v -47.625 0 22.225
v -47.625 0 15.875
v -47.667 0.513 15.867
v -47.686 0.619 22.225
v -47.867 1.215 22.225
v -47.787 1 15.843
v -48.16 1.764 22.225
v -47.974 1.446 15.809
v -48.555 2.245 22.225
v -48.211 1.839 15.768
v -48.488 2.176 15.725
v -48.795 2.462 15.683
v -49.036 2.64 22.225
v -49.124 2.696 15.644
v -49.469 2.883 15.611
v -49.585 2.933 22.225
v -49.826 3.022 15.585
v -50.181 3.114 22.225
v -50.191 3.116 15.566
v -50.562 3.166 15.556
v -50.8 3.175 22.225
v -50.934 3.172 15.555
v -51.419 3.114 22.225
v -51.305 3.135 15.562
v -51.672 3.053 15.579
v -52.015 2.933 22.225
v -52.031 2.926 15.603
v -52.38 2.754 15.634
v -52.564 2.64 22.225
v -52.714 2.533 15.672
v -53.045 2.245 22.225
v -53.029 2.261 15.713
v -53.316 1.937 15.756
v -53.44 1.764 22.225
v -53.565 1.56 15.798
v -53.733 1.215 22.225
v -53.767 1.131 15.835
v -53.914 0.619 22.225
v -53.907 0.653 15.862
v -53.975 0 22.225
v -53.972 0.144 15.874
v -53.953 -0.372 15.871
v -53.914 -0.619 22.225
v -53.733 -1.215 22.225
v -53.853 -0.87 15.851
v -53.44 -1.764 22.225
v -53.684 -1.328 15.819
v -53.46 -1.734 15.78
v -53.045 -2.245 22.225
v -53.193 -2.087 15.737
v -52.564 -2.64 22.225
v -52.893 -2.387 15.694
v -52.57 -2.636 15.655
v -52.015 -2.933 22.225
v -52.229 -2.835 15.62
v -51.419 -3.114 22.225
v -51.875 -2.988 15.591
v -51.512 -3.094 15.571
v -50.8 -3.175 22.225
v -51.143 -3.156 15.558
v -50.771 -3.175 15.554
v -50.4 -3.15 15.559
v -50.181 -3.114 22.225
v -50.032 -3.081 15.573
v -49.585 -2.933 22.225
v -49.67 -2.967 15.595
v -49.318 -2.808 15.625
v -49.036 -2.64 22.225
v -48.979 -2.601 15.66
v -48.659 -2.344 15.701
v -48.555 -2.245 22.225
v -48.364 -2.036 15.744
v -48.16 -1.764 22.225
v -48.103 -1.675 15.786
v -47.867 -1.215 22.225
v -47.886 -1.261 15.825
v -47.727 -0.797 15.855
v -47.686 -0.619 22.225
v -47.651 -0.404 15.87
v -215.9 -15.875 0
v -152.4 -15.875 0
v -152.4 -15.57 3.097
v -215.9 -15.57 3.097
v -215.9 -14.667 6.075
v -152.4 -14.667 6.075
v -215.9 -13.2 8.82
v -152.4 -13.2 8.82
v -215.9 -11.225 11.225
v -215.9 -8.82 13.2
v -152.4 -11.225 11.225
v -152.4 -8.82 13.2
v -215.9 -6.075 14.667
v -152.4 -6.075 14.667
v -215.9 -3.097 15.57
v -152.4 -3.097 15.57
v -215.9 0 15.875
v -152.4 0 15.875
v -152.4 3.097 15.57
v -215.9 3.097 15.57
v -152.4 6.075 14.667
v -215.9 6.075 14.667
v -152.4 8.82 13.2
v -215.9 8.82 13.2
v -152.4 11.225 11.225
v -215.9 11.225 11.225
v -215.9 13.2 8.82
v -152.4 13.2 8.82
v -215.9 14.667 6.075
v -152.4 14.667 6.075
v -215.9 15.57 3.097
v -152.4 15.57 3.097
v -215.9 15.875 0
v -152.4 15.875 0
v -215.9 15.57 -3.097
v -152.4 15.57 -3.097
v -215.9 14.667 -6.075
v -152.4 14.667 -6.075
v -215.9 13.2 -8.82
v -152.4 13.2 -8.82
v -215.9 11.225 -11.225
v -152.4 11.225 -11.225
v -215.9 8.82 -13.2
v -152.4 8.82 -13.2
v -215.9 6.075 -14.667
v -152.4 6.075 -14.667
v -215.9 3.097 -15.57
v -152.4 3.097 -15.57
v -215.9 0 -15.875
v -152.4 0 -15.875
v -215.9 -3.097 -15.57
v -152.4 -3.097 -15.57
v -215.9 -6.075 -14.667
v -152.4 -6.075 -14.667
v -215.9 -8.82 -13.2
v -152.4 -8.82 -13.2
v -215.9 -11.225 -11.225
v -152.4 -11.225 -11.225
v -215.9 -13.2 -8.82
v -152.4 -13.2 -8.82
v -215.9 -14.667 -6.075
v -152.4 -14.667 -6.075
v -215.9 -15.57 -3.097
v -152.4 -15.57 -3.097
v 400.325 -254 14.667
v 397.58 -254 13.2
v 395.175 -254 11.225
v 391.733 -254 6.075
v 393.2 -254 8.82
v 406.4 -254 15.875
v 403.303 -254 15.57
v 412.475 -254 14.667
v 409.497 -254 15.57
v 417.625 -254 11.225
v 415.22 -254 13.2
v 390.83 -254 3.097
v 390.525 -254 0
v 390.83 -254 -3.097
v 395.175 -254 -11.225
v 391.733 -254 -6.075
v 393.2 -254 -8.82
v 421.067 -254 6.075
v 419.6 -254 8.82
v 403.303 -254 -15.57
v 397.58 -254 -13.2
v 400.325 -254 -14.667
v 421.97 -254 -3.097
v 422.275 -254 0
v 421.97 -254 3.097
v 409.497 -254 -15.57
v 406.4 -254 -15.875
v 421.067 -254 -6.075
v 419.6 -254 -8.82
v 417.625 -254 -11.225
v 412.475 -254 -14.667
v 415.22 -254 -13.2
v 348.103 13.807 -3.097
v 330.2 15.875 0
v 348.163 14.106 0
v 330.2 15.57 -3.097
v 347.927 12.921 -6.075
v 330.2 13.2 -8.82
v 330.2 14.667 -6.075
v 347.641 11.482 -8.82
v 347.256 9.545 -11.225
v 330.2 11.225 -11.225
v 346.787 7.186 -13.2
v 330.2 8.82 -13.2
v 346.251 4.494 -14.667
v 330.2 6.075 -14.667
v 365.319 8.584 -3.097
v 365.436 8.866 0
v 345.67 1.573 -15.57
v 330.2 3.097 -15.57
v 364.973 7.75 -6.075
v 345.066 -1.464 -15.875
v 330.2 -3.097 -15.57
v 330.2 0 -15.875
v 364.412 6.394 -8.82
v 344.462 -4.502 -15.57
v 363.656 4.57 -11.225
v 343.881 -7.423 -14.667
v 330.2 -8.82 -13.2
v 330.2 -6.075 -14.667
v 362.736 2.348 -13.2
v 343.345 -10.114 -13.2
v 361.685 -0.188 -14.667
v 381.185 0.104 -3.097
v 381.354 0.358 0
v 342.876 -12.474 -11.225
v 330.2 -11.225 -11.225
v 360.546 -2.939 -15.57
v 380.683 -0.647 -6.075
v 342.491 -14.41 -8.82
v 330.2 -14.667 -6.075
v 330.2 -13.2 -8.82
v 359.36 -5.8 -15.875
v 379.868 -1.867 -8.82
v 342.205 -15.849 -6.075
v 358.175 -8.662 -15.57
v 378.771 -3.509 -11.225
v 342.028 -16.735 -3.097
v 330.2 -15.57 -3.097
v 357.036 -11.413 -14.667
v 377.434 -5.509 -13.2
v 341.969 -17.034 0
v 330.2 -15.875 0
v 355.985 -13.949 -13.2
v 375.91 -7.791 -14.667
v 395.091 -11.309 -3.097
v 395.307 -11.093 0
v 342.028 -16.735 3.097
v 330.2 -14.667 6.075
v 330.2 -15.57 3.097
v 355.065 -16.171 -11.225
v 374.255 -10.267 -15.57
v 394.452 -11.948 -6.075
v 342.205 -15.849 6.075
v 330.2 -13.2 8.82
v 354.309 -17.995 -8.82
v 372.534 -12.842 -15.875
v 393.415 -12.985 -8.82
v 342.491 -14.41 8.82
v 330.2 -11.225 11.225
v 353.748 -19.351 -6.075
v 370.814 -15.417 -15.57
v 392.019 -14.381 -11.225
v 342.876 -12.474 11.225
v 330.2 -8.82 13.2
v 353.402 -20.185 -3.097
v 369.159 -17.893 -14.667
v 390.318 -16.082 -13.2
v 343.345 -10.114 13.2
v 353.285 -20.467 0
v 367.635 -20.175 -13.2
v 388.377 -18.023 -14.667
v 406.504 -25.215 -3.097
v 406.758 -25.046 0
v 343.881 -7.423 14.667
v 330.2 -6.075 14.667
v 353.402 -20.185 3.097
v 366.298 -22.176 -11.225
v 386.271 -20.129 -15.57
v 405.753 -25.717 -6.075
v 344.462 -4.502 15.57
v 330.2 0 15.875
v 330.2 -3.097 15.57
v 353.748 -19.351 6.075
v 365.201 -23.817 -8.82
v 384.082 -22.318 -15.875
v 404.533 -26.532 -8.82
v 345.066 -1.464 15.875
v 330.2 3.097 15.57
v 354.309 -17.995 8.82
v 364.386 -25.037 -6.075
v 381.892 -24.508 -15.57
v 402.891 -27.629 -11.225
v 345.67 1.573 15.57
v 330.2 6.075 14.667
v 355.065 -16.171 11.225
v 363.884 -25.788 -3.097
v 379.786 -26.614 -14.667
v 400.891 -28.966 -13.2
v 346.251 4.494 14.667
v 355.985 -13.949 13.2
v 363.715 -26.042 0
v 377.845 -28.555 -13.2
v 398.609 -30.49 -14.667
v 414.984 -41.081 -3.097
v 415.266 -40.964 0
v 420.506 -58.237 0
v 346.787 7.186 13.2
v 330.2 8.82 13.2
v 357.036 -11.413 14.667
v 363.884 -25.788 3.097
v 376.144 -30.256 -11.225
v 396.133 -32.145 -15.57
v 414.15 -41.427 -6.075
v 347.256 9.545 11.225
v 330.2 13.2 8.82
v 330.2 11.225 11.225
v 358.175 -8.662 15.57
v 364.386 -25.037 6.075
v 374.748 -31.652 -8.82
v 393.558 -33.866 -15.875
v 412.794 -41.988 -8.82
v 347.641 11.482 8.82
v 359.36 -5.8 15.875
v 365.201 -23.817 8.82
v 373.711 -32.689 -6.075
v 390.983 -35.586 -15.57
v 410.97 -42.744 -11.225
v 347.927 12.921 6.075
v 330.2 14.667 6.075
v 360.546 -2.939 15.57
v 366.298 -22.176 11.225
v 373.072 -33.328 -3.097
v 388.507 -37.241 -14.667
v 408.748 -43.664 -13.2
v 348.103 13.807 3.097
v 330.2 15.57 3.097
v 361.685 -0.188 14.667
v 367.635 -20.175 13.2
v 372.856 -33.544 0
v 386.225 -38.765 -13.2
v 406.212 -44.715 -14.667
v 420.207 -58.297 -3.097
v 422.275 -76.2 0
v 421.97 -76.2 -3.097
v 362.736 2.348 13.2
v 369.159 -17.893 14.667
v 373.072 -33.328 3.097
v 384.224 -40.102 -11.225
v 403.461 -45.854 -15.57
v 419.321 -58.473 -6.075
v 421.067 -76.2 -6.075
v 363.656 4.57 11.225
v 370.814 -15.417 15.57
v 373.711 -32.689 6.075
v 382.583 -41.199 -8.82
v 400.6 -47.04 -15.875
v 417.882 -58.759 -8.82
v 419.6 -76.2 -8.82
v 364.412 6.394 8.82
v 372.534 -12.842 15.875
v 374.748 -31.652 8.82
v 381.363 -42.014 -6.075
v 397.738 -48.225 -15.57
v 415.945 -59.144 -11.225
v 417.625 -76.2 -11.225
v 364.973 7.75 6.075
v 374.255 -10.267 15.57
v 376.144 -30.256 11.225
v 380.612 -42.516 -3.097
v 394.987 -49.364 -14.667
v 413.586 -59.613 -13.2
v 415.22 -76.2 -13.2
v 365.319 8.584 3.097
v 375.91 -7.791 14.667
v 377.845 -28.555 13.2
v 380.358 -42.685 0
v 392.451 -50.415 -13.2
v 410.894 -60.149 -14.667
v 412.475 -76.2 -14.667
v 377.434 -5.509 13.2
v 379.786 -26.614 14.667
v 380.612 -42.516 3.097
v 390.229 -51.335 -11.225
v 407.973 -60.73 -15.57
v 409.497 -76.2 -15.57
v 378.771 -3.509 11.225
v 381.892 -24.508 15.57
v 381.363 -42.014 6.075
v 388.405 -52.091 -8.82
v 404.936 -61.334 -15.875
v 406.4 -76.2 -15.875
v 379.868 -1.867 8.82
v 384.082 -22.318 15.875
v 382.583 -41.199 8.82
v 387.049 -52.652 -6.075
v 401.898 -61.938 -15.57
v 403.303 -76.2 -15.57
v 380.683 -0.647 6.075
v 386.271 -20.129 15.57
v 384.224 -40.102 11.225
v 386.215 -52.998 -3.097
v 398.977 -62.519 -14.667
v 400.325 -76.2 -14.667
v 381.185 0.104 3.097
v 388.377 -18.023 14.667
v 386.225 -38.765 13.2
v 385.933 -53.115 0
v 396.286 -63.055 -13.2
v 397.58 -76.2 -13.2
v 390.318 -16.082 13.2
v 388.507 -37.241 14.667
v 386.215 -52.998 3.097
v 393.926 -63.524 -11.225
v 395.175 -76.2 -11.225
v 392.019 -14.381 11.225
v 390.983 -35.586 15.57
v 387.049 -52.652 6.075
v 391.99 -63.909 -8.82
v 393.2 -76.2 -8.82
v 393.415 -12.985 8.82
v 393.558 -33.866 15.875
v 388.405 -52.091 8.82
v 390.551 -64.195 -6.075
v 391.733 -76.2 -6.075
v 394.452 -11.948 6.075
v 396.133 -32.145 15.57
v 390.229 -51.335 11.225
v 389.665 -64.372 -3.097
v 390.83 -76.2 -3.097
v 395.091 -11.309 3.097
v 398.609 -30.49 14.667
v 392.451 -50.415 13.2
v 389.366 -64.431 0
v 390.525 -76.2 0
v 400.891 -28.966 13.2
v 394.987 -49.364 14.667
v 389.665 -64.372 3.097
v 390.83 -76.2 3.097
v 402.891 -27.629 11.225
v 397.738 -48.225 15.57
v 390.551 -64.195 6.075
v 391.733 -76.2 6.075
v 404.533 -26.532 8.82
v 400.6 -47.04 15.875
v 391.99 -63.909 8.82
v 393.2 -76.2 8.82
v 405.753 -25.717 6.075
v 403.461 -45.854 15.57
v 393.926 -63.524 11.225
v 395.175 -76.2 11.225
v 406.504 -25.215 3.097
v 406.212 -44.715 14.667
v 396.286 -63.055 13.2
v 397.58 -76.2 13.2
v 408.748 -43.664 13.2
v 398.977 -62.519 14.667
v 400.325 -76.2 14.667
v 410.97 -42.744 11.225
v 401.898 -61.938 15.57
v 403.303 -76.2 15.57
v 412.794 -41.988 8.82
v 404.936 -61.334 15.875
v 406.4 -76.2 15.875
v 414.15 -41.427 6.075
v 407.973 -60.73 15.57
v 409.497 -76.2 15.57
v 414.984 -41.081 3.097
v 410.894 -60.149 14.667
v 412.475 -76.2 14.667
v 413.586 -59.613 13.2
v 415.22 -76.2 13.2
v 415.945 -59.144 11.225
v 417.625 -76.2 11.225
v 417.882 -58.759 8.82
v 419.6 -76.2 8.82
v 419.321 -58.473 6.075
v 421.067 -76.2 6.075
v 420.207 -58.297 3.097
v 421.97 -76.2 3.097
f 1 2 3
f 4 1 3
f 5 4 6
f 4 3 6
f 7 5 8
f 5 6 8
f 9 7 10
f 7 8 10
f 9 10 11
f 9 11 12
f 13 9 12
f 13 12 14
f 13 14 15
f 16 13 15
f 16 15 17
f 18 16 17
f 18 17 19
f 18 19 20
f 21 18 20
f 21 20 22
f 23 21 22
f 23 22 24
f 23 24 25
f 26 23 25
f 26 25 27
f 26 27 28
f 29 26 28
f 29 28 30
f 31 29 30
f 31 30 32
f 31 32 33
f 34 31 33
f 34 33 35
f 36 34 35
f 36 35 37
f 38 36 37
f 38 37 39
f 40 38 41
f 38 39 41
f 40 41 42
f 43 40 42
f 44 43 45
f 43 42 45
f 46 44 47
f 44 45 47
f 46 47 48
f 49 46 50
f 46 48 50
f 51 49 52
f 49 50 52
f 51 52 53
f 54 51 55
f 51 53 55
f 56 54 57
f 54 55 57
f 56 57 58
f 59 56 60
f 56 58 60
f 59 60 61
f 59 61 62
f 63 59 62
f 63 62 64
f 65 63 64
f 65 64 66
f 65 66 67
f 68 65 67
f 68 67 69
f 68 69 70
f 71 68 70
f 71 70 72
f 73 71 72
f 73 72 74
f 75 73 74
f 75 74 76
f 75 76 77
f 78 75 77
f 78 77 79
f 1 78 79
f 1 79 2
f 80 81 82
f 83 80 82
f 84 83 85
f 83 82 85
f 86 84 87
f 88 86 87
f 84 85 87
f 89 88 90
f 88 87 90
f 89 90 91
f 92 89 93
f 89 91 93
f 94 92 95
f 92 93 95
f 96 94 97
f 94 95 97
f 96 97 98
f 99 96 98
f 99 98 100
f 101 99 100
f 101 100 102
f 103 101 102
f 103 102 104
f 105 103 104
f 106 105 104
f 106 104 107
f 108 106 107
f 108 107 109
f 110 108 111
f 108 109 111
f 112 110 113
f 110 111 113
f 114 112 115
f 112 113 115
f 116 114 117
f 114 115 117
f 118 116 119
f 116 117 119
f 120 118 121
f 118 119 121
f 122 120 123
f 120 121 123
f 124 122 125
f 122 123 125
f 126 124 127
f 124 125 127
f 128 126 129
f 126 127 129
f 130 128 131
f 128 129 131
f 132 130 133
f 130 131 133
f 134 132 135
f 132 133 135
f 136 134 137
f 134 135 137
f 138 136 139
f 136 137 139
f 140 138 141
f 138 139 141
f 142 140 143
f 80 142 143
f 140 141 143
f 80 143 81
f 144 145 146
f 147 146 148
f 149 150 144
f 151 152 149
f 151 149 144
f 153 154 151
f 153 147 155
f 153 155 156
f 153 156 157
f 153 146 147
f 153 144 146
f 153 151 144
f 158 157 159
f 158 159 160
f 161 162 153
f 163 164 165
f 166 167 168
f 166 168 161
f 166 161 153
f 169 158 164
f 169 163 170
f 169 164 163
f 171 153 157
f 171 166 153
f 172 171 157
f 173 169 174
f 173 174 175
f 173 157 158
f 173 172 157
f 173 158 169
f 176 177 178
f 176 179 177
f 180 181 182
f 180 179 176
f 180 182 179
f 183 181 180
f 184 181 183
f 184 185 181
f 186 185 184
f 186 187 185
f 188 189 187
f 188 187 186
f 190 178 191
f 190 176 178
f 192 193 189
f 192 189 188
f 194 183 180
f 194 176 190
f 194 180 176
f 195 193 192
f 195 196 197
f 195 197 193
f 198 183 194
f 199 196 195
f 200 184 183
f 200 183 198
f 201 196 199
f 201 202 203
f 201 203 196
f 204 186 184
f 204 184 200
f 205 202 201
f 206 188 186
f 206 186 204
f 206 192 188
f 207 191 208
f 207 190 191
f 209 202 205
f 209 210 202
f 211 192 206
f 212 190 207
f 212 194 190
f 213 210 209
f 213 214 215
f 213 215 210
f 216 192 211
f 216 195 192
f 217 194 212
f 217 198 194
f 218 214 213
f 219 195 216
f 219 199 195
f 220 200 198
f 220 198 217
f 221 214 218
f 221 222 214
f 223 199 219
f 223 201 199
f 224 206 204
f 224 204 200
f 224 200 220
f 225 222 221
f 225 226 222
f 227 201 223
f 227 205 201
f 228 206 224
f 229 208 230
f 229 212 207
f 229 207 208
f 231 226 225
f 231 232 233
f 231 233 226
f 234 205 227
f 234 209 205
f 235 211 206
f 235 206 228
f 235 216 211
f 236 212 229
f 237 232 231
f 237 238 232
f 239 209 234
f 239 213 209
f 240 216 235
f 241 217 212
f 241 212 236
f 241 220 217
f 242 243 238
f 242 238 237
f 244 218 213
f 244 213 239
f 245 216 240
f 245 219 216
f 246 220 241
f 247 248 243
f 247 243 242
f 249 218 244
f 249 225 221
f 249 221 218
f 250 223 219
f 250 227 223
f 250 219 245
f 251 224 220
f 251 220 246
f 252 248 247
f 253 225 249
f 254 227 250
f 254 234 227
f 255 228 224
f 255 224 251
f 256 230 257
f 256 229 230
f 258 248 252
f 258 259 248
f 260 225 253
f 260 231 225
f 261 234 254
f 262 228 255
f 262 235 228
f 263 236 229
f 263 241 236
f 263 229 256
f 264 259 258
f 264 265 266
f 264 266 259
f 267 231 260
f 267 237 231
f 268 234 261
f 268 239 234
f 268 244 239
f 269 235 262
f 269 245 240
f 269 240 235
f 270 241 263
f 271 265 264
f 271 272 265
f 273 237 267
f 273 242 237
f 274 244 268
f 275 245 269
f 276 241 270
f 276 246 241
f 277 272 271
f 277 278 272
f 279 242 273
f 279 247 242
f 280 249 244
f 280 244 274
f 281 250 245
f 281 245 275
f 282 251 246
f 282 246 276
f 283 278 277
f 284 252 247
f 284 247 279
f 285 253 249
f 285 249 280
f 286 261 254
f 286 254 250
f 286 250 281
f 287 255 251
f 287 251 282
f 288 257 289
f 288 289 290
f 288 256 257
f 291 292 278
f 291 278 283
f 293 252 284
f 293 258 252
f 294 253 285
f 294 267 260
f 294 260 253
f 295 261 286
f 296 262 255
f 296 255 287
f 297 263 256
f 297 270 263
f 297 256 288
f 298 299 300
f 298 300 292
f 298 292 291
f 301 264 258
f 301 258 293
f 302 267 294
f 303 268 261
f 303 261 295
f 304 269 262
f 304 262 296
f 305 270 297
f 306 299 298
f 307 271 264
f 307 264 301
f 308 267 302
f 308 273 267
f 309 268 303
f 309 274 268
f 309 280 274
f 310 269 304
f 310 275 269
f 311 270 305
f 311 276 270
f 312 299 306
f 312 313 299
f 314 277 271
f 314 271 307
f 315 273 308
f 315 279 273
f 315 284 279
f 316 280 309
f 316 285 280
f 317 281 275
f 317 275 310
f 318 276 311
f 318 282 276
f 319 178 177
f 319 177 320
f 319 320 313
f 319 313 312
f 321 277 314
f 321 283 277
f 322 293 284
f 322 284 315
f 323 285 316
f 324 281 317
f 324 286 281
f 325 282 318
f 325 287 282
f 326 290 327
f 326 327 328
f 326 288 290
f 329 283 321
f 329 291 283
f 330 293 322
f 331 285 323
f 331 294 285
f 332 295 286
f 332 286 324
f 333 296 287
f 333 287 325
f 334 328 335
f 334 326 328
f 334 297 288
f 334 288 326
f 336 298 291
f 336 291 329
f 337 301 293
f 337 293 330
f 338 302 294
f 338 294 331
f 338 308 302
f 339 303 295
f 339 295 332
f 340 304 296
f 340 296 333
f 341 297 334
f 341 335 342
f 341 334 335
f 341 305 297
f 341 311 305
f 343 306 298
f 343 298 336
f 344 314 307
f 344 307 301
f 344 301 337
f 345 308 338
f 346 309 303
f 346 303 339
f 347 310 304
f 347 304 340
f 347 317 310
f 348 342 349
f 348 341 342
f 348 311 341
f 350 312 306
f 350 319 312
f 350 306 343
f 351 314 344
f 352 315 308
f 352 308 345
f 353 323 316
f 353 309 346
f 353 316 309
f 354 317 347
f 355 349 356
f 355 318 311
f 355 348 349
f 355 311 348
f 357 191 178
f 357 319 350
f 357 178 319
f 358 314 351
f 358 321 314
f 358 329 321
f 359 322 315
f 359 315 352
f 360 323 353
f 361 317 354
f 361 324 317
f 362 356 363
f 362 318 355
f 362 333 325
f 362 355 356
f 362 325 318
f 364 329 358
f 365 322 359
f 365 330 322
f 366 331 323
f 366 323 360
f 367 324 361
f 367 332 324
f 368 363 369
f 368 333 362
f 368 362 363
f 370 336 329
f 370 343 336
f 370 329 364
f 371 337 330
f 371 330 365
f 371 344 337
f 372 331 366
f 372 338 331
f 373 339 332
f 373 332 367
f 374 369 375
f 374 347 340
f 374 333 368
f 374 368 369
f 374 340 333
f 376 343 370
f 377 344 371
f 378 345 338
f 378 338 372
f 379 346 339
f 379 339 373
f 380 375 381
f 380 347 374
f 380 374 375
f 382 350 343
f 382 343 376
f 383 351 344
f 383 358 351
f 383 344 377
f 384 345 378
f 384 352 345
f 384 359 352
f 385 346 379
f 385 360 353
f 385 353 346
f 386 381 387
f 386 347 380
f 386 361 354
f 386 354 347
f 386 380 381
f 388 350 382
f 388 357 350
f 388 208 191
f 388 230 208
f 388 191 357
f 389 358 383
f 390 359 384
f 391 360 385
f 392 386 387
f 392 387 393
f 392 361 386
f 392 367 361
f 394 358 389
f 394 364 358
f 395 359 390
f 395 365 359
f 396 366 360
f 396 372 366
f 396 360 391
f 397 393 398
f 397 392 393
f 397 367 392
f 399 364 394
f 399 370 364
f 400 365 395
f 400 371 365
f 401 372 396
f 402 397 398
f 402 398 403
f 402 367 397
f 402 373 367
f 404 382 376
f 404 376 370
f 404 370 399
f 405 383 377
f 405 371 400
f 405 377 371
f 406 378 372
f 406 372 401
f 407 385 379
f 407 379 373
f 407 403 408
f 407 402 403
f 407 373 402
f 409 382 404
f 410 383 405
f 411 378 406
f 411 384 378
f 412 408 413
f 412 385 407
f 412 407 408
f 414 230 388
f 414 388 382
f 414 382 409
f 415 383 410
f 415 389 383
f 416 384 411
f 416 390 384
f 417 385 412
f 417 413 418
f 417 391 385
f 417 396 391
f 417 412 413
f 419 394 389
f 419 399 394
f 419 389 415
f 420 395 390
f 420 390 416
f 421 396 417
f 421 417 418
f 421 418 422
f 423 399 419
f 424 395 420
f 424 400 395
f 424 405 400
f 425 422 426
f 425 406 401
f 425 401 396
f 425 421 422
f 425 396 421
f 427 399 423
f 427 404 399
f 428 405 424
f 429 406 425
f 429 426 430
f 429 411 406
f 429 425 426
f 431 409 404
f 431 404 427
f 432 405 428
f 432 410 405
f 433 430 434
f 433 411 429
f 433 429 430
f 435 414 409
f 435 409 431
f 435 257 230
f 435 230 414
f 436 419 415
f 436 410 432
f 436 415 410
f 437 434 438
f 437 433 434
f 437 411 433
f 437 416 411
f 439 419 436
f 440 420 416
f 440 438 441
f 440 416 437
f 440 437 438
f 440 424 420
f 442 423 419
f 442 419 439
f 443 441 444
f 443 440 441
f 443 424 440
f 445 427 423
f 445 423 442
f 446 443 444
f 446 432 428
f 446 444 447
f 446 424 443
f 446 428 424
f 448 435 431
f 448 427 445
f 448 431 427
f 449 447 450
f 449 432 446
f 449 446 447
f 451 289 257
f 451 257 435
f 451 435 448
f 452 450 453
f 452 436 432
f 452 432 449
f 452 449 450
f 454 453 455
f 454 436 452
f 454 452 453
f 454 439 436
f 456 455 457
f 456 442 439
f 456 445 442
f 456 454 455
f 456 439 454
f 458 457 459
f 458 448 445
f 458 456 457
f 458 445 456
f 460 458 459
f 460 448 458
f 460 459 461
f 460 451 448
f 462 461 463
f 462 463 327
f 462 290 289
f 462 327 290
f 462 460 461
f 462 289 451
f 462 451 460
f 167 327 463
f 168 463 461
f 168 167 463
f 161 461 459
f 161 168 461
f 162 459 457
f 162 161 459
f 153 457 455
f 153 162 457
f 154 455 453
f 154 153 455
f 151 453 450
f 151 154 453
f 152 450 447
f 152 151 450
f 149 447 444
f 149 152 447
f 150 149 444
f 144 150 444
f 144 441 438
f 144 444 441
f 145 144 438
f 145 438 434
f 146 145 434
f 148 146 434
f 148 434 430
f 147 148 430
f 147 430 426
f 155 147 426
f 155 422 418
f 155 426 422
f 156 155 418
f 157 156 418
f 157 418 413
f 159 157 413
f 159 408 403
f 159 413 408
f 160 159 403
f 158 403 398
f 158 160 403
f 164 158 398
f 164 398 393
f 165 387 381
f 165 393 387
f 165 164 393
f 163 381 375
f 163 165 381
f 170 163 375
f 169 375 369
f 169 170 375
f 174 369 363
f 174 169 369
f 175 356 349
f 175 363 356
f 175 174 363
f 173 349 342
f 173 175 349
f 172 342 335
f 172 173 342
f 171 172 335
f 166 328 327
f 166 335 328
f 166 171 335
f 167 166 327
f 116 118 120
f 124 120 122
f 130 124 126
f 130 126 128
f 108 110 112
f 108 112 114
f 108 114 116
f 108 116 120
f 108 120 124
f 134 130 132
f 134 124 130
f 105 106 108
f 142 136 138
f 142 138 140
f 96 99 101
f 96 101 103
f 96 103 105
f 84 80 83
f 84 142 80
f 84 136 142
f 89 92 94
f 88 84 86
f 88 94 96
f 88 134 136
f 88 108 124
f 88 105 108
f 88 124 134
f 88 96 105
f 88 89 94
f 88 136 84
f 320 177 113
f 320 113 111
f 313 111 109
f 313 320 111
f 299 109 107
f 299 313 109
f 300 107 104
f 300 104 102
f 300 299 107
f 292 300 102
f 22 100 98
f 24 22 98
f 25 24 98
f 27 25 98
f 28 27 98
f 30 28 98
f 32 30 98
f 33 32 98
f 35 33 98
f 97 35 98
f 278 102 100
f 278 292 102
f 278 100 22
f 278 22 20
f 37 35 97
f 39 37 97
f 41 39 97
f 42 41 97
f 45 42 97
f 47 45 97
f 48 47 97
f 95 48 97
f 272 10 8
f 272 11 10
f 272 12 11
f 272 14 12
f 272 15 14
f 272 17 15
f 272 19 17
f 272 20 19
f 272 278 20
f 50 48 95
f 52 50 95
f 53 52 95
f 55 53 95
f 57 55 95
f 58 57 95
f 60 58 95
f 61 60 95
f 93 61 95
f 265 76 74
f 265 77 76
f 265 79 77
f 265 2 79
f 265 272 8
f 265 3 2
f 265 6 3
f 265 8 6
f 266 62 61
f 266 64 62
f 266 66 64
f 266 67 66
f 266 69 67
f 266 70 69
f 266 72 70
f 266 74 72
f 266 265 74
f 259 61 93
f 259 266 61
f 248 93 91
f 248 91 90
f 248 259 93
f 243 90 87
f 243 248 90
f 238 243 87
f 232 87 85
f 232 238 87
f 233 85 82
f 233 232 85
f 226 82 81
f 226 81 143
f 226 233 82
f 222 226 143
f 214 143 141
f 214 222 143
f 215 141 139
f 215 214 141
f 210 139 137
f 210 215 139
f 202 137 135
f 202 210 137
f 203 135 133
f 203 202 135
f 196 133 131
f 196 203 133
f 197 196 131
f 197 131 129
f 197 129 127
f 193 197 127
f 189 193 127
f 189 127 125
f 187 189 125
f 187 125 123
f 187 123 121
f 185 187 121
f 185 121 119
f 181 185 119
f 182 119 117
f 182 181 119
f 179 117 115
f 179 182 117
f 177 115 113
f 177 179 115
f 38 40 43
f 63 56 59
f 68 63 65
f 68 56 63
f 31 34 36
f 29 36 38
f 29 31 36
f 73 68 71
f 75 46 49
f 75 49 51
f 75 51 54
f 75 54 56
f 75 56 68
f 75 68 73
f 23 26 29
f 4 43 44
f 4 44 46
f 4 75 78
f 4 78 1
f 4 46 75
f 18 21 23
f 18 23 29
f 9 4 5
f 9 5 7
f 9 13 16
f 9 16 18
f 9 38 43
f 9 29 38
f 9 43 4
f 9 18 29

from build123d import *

# Parameters (mm, degrees)
F2_R     = 15.875
F4_R     = 3.175
F5_DEPTH = 22.225
F6_R     = 15.875
F7_DEPTH = 63.5


with BuildPart() as f3:
    # F3: sweep along a path in F0
    with BuildLine(Plane.XY) as f3_path:
        Line((-152.4, 0), (0, 0))
        Line((0, 0), (330.2, 0))
        ThreePointArc((330.2, 0), (384.0815367264, -22.3184632736), (406.4, -76.2))
        Line((406.4, -76.2), (406.4, -254))
    # F2 (on offset) → F3 (sweep)
    with BuildSketch(Plane.XZ.offset(254)):
        with Locations((406.4, 0)):
            Circle(F2_R)
    sweep(path=f3_path.line)

    # F4 (on Top) → F5 (join)
    with BuildSketch(Plane.XY):
        with Locations((-50.8, 0)):
            Circle(F4_R)
    extrude(amount=F5_DEPTH)

    # F6 (on face) → F7 (join)
    with BuildSketch(Plane(origin=(-152.4, 0, 0), x_dir=(0, -1, 0), z_dir=(-1, 0, 0))):
        Circle(F6_R)
    extrude(amount=F7_DEPTH)


solid = f3.part
